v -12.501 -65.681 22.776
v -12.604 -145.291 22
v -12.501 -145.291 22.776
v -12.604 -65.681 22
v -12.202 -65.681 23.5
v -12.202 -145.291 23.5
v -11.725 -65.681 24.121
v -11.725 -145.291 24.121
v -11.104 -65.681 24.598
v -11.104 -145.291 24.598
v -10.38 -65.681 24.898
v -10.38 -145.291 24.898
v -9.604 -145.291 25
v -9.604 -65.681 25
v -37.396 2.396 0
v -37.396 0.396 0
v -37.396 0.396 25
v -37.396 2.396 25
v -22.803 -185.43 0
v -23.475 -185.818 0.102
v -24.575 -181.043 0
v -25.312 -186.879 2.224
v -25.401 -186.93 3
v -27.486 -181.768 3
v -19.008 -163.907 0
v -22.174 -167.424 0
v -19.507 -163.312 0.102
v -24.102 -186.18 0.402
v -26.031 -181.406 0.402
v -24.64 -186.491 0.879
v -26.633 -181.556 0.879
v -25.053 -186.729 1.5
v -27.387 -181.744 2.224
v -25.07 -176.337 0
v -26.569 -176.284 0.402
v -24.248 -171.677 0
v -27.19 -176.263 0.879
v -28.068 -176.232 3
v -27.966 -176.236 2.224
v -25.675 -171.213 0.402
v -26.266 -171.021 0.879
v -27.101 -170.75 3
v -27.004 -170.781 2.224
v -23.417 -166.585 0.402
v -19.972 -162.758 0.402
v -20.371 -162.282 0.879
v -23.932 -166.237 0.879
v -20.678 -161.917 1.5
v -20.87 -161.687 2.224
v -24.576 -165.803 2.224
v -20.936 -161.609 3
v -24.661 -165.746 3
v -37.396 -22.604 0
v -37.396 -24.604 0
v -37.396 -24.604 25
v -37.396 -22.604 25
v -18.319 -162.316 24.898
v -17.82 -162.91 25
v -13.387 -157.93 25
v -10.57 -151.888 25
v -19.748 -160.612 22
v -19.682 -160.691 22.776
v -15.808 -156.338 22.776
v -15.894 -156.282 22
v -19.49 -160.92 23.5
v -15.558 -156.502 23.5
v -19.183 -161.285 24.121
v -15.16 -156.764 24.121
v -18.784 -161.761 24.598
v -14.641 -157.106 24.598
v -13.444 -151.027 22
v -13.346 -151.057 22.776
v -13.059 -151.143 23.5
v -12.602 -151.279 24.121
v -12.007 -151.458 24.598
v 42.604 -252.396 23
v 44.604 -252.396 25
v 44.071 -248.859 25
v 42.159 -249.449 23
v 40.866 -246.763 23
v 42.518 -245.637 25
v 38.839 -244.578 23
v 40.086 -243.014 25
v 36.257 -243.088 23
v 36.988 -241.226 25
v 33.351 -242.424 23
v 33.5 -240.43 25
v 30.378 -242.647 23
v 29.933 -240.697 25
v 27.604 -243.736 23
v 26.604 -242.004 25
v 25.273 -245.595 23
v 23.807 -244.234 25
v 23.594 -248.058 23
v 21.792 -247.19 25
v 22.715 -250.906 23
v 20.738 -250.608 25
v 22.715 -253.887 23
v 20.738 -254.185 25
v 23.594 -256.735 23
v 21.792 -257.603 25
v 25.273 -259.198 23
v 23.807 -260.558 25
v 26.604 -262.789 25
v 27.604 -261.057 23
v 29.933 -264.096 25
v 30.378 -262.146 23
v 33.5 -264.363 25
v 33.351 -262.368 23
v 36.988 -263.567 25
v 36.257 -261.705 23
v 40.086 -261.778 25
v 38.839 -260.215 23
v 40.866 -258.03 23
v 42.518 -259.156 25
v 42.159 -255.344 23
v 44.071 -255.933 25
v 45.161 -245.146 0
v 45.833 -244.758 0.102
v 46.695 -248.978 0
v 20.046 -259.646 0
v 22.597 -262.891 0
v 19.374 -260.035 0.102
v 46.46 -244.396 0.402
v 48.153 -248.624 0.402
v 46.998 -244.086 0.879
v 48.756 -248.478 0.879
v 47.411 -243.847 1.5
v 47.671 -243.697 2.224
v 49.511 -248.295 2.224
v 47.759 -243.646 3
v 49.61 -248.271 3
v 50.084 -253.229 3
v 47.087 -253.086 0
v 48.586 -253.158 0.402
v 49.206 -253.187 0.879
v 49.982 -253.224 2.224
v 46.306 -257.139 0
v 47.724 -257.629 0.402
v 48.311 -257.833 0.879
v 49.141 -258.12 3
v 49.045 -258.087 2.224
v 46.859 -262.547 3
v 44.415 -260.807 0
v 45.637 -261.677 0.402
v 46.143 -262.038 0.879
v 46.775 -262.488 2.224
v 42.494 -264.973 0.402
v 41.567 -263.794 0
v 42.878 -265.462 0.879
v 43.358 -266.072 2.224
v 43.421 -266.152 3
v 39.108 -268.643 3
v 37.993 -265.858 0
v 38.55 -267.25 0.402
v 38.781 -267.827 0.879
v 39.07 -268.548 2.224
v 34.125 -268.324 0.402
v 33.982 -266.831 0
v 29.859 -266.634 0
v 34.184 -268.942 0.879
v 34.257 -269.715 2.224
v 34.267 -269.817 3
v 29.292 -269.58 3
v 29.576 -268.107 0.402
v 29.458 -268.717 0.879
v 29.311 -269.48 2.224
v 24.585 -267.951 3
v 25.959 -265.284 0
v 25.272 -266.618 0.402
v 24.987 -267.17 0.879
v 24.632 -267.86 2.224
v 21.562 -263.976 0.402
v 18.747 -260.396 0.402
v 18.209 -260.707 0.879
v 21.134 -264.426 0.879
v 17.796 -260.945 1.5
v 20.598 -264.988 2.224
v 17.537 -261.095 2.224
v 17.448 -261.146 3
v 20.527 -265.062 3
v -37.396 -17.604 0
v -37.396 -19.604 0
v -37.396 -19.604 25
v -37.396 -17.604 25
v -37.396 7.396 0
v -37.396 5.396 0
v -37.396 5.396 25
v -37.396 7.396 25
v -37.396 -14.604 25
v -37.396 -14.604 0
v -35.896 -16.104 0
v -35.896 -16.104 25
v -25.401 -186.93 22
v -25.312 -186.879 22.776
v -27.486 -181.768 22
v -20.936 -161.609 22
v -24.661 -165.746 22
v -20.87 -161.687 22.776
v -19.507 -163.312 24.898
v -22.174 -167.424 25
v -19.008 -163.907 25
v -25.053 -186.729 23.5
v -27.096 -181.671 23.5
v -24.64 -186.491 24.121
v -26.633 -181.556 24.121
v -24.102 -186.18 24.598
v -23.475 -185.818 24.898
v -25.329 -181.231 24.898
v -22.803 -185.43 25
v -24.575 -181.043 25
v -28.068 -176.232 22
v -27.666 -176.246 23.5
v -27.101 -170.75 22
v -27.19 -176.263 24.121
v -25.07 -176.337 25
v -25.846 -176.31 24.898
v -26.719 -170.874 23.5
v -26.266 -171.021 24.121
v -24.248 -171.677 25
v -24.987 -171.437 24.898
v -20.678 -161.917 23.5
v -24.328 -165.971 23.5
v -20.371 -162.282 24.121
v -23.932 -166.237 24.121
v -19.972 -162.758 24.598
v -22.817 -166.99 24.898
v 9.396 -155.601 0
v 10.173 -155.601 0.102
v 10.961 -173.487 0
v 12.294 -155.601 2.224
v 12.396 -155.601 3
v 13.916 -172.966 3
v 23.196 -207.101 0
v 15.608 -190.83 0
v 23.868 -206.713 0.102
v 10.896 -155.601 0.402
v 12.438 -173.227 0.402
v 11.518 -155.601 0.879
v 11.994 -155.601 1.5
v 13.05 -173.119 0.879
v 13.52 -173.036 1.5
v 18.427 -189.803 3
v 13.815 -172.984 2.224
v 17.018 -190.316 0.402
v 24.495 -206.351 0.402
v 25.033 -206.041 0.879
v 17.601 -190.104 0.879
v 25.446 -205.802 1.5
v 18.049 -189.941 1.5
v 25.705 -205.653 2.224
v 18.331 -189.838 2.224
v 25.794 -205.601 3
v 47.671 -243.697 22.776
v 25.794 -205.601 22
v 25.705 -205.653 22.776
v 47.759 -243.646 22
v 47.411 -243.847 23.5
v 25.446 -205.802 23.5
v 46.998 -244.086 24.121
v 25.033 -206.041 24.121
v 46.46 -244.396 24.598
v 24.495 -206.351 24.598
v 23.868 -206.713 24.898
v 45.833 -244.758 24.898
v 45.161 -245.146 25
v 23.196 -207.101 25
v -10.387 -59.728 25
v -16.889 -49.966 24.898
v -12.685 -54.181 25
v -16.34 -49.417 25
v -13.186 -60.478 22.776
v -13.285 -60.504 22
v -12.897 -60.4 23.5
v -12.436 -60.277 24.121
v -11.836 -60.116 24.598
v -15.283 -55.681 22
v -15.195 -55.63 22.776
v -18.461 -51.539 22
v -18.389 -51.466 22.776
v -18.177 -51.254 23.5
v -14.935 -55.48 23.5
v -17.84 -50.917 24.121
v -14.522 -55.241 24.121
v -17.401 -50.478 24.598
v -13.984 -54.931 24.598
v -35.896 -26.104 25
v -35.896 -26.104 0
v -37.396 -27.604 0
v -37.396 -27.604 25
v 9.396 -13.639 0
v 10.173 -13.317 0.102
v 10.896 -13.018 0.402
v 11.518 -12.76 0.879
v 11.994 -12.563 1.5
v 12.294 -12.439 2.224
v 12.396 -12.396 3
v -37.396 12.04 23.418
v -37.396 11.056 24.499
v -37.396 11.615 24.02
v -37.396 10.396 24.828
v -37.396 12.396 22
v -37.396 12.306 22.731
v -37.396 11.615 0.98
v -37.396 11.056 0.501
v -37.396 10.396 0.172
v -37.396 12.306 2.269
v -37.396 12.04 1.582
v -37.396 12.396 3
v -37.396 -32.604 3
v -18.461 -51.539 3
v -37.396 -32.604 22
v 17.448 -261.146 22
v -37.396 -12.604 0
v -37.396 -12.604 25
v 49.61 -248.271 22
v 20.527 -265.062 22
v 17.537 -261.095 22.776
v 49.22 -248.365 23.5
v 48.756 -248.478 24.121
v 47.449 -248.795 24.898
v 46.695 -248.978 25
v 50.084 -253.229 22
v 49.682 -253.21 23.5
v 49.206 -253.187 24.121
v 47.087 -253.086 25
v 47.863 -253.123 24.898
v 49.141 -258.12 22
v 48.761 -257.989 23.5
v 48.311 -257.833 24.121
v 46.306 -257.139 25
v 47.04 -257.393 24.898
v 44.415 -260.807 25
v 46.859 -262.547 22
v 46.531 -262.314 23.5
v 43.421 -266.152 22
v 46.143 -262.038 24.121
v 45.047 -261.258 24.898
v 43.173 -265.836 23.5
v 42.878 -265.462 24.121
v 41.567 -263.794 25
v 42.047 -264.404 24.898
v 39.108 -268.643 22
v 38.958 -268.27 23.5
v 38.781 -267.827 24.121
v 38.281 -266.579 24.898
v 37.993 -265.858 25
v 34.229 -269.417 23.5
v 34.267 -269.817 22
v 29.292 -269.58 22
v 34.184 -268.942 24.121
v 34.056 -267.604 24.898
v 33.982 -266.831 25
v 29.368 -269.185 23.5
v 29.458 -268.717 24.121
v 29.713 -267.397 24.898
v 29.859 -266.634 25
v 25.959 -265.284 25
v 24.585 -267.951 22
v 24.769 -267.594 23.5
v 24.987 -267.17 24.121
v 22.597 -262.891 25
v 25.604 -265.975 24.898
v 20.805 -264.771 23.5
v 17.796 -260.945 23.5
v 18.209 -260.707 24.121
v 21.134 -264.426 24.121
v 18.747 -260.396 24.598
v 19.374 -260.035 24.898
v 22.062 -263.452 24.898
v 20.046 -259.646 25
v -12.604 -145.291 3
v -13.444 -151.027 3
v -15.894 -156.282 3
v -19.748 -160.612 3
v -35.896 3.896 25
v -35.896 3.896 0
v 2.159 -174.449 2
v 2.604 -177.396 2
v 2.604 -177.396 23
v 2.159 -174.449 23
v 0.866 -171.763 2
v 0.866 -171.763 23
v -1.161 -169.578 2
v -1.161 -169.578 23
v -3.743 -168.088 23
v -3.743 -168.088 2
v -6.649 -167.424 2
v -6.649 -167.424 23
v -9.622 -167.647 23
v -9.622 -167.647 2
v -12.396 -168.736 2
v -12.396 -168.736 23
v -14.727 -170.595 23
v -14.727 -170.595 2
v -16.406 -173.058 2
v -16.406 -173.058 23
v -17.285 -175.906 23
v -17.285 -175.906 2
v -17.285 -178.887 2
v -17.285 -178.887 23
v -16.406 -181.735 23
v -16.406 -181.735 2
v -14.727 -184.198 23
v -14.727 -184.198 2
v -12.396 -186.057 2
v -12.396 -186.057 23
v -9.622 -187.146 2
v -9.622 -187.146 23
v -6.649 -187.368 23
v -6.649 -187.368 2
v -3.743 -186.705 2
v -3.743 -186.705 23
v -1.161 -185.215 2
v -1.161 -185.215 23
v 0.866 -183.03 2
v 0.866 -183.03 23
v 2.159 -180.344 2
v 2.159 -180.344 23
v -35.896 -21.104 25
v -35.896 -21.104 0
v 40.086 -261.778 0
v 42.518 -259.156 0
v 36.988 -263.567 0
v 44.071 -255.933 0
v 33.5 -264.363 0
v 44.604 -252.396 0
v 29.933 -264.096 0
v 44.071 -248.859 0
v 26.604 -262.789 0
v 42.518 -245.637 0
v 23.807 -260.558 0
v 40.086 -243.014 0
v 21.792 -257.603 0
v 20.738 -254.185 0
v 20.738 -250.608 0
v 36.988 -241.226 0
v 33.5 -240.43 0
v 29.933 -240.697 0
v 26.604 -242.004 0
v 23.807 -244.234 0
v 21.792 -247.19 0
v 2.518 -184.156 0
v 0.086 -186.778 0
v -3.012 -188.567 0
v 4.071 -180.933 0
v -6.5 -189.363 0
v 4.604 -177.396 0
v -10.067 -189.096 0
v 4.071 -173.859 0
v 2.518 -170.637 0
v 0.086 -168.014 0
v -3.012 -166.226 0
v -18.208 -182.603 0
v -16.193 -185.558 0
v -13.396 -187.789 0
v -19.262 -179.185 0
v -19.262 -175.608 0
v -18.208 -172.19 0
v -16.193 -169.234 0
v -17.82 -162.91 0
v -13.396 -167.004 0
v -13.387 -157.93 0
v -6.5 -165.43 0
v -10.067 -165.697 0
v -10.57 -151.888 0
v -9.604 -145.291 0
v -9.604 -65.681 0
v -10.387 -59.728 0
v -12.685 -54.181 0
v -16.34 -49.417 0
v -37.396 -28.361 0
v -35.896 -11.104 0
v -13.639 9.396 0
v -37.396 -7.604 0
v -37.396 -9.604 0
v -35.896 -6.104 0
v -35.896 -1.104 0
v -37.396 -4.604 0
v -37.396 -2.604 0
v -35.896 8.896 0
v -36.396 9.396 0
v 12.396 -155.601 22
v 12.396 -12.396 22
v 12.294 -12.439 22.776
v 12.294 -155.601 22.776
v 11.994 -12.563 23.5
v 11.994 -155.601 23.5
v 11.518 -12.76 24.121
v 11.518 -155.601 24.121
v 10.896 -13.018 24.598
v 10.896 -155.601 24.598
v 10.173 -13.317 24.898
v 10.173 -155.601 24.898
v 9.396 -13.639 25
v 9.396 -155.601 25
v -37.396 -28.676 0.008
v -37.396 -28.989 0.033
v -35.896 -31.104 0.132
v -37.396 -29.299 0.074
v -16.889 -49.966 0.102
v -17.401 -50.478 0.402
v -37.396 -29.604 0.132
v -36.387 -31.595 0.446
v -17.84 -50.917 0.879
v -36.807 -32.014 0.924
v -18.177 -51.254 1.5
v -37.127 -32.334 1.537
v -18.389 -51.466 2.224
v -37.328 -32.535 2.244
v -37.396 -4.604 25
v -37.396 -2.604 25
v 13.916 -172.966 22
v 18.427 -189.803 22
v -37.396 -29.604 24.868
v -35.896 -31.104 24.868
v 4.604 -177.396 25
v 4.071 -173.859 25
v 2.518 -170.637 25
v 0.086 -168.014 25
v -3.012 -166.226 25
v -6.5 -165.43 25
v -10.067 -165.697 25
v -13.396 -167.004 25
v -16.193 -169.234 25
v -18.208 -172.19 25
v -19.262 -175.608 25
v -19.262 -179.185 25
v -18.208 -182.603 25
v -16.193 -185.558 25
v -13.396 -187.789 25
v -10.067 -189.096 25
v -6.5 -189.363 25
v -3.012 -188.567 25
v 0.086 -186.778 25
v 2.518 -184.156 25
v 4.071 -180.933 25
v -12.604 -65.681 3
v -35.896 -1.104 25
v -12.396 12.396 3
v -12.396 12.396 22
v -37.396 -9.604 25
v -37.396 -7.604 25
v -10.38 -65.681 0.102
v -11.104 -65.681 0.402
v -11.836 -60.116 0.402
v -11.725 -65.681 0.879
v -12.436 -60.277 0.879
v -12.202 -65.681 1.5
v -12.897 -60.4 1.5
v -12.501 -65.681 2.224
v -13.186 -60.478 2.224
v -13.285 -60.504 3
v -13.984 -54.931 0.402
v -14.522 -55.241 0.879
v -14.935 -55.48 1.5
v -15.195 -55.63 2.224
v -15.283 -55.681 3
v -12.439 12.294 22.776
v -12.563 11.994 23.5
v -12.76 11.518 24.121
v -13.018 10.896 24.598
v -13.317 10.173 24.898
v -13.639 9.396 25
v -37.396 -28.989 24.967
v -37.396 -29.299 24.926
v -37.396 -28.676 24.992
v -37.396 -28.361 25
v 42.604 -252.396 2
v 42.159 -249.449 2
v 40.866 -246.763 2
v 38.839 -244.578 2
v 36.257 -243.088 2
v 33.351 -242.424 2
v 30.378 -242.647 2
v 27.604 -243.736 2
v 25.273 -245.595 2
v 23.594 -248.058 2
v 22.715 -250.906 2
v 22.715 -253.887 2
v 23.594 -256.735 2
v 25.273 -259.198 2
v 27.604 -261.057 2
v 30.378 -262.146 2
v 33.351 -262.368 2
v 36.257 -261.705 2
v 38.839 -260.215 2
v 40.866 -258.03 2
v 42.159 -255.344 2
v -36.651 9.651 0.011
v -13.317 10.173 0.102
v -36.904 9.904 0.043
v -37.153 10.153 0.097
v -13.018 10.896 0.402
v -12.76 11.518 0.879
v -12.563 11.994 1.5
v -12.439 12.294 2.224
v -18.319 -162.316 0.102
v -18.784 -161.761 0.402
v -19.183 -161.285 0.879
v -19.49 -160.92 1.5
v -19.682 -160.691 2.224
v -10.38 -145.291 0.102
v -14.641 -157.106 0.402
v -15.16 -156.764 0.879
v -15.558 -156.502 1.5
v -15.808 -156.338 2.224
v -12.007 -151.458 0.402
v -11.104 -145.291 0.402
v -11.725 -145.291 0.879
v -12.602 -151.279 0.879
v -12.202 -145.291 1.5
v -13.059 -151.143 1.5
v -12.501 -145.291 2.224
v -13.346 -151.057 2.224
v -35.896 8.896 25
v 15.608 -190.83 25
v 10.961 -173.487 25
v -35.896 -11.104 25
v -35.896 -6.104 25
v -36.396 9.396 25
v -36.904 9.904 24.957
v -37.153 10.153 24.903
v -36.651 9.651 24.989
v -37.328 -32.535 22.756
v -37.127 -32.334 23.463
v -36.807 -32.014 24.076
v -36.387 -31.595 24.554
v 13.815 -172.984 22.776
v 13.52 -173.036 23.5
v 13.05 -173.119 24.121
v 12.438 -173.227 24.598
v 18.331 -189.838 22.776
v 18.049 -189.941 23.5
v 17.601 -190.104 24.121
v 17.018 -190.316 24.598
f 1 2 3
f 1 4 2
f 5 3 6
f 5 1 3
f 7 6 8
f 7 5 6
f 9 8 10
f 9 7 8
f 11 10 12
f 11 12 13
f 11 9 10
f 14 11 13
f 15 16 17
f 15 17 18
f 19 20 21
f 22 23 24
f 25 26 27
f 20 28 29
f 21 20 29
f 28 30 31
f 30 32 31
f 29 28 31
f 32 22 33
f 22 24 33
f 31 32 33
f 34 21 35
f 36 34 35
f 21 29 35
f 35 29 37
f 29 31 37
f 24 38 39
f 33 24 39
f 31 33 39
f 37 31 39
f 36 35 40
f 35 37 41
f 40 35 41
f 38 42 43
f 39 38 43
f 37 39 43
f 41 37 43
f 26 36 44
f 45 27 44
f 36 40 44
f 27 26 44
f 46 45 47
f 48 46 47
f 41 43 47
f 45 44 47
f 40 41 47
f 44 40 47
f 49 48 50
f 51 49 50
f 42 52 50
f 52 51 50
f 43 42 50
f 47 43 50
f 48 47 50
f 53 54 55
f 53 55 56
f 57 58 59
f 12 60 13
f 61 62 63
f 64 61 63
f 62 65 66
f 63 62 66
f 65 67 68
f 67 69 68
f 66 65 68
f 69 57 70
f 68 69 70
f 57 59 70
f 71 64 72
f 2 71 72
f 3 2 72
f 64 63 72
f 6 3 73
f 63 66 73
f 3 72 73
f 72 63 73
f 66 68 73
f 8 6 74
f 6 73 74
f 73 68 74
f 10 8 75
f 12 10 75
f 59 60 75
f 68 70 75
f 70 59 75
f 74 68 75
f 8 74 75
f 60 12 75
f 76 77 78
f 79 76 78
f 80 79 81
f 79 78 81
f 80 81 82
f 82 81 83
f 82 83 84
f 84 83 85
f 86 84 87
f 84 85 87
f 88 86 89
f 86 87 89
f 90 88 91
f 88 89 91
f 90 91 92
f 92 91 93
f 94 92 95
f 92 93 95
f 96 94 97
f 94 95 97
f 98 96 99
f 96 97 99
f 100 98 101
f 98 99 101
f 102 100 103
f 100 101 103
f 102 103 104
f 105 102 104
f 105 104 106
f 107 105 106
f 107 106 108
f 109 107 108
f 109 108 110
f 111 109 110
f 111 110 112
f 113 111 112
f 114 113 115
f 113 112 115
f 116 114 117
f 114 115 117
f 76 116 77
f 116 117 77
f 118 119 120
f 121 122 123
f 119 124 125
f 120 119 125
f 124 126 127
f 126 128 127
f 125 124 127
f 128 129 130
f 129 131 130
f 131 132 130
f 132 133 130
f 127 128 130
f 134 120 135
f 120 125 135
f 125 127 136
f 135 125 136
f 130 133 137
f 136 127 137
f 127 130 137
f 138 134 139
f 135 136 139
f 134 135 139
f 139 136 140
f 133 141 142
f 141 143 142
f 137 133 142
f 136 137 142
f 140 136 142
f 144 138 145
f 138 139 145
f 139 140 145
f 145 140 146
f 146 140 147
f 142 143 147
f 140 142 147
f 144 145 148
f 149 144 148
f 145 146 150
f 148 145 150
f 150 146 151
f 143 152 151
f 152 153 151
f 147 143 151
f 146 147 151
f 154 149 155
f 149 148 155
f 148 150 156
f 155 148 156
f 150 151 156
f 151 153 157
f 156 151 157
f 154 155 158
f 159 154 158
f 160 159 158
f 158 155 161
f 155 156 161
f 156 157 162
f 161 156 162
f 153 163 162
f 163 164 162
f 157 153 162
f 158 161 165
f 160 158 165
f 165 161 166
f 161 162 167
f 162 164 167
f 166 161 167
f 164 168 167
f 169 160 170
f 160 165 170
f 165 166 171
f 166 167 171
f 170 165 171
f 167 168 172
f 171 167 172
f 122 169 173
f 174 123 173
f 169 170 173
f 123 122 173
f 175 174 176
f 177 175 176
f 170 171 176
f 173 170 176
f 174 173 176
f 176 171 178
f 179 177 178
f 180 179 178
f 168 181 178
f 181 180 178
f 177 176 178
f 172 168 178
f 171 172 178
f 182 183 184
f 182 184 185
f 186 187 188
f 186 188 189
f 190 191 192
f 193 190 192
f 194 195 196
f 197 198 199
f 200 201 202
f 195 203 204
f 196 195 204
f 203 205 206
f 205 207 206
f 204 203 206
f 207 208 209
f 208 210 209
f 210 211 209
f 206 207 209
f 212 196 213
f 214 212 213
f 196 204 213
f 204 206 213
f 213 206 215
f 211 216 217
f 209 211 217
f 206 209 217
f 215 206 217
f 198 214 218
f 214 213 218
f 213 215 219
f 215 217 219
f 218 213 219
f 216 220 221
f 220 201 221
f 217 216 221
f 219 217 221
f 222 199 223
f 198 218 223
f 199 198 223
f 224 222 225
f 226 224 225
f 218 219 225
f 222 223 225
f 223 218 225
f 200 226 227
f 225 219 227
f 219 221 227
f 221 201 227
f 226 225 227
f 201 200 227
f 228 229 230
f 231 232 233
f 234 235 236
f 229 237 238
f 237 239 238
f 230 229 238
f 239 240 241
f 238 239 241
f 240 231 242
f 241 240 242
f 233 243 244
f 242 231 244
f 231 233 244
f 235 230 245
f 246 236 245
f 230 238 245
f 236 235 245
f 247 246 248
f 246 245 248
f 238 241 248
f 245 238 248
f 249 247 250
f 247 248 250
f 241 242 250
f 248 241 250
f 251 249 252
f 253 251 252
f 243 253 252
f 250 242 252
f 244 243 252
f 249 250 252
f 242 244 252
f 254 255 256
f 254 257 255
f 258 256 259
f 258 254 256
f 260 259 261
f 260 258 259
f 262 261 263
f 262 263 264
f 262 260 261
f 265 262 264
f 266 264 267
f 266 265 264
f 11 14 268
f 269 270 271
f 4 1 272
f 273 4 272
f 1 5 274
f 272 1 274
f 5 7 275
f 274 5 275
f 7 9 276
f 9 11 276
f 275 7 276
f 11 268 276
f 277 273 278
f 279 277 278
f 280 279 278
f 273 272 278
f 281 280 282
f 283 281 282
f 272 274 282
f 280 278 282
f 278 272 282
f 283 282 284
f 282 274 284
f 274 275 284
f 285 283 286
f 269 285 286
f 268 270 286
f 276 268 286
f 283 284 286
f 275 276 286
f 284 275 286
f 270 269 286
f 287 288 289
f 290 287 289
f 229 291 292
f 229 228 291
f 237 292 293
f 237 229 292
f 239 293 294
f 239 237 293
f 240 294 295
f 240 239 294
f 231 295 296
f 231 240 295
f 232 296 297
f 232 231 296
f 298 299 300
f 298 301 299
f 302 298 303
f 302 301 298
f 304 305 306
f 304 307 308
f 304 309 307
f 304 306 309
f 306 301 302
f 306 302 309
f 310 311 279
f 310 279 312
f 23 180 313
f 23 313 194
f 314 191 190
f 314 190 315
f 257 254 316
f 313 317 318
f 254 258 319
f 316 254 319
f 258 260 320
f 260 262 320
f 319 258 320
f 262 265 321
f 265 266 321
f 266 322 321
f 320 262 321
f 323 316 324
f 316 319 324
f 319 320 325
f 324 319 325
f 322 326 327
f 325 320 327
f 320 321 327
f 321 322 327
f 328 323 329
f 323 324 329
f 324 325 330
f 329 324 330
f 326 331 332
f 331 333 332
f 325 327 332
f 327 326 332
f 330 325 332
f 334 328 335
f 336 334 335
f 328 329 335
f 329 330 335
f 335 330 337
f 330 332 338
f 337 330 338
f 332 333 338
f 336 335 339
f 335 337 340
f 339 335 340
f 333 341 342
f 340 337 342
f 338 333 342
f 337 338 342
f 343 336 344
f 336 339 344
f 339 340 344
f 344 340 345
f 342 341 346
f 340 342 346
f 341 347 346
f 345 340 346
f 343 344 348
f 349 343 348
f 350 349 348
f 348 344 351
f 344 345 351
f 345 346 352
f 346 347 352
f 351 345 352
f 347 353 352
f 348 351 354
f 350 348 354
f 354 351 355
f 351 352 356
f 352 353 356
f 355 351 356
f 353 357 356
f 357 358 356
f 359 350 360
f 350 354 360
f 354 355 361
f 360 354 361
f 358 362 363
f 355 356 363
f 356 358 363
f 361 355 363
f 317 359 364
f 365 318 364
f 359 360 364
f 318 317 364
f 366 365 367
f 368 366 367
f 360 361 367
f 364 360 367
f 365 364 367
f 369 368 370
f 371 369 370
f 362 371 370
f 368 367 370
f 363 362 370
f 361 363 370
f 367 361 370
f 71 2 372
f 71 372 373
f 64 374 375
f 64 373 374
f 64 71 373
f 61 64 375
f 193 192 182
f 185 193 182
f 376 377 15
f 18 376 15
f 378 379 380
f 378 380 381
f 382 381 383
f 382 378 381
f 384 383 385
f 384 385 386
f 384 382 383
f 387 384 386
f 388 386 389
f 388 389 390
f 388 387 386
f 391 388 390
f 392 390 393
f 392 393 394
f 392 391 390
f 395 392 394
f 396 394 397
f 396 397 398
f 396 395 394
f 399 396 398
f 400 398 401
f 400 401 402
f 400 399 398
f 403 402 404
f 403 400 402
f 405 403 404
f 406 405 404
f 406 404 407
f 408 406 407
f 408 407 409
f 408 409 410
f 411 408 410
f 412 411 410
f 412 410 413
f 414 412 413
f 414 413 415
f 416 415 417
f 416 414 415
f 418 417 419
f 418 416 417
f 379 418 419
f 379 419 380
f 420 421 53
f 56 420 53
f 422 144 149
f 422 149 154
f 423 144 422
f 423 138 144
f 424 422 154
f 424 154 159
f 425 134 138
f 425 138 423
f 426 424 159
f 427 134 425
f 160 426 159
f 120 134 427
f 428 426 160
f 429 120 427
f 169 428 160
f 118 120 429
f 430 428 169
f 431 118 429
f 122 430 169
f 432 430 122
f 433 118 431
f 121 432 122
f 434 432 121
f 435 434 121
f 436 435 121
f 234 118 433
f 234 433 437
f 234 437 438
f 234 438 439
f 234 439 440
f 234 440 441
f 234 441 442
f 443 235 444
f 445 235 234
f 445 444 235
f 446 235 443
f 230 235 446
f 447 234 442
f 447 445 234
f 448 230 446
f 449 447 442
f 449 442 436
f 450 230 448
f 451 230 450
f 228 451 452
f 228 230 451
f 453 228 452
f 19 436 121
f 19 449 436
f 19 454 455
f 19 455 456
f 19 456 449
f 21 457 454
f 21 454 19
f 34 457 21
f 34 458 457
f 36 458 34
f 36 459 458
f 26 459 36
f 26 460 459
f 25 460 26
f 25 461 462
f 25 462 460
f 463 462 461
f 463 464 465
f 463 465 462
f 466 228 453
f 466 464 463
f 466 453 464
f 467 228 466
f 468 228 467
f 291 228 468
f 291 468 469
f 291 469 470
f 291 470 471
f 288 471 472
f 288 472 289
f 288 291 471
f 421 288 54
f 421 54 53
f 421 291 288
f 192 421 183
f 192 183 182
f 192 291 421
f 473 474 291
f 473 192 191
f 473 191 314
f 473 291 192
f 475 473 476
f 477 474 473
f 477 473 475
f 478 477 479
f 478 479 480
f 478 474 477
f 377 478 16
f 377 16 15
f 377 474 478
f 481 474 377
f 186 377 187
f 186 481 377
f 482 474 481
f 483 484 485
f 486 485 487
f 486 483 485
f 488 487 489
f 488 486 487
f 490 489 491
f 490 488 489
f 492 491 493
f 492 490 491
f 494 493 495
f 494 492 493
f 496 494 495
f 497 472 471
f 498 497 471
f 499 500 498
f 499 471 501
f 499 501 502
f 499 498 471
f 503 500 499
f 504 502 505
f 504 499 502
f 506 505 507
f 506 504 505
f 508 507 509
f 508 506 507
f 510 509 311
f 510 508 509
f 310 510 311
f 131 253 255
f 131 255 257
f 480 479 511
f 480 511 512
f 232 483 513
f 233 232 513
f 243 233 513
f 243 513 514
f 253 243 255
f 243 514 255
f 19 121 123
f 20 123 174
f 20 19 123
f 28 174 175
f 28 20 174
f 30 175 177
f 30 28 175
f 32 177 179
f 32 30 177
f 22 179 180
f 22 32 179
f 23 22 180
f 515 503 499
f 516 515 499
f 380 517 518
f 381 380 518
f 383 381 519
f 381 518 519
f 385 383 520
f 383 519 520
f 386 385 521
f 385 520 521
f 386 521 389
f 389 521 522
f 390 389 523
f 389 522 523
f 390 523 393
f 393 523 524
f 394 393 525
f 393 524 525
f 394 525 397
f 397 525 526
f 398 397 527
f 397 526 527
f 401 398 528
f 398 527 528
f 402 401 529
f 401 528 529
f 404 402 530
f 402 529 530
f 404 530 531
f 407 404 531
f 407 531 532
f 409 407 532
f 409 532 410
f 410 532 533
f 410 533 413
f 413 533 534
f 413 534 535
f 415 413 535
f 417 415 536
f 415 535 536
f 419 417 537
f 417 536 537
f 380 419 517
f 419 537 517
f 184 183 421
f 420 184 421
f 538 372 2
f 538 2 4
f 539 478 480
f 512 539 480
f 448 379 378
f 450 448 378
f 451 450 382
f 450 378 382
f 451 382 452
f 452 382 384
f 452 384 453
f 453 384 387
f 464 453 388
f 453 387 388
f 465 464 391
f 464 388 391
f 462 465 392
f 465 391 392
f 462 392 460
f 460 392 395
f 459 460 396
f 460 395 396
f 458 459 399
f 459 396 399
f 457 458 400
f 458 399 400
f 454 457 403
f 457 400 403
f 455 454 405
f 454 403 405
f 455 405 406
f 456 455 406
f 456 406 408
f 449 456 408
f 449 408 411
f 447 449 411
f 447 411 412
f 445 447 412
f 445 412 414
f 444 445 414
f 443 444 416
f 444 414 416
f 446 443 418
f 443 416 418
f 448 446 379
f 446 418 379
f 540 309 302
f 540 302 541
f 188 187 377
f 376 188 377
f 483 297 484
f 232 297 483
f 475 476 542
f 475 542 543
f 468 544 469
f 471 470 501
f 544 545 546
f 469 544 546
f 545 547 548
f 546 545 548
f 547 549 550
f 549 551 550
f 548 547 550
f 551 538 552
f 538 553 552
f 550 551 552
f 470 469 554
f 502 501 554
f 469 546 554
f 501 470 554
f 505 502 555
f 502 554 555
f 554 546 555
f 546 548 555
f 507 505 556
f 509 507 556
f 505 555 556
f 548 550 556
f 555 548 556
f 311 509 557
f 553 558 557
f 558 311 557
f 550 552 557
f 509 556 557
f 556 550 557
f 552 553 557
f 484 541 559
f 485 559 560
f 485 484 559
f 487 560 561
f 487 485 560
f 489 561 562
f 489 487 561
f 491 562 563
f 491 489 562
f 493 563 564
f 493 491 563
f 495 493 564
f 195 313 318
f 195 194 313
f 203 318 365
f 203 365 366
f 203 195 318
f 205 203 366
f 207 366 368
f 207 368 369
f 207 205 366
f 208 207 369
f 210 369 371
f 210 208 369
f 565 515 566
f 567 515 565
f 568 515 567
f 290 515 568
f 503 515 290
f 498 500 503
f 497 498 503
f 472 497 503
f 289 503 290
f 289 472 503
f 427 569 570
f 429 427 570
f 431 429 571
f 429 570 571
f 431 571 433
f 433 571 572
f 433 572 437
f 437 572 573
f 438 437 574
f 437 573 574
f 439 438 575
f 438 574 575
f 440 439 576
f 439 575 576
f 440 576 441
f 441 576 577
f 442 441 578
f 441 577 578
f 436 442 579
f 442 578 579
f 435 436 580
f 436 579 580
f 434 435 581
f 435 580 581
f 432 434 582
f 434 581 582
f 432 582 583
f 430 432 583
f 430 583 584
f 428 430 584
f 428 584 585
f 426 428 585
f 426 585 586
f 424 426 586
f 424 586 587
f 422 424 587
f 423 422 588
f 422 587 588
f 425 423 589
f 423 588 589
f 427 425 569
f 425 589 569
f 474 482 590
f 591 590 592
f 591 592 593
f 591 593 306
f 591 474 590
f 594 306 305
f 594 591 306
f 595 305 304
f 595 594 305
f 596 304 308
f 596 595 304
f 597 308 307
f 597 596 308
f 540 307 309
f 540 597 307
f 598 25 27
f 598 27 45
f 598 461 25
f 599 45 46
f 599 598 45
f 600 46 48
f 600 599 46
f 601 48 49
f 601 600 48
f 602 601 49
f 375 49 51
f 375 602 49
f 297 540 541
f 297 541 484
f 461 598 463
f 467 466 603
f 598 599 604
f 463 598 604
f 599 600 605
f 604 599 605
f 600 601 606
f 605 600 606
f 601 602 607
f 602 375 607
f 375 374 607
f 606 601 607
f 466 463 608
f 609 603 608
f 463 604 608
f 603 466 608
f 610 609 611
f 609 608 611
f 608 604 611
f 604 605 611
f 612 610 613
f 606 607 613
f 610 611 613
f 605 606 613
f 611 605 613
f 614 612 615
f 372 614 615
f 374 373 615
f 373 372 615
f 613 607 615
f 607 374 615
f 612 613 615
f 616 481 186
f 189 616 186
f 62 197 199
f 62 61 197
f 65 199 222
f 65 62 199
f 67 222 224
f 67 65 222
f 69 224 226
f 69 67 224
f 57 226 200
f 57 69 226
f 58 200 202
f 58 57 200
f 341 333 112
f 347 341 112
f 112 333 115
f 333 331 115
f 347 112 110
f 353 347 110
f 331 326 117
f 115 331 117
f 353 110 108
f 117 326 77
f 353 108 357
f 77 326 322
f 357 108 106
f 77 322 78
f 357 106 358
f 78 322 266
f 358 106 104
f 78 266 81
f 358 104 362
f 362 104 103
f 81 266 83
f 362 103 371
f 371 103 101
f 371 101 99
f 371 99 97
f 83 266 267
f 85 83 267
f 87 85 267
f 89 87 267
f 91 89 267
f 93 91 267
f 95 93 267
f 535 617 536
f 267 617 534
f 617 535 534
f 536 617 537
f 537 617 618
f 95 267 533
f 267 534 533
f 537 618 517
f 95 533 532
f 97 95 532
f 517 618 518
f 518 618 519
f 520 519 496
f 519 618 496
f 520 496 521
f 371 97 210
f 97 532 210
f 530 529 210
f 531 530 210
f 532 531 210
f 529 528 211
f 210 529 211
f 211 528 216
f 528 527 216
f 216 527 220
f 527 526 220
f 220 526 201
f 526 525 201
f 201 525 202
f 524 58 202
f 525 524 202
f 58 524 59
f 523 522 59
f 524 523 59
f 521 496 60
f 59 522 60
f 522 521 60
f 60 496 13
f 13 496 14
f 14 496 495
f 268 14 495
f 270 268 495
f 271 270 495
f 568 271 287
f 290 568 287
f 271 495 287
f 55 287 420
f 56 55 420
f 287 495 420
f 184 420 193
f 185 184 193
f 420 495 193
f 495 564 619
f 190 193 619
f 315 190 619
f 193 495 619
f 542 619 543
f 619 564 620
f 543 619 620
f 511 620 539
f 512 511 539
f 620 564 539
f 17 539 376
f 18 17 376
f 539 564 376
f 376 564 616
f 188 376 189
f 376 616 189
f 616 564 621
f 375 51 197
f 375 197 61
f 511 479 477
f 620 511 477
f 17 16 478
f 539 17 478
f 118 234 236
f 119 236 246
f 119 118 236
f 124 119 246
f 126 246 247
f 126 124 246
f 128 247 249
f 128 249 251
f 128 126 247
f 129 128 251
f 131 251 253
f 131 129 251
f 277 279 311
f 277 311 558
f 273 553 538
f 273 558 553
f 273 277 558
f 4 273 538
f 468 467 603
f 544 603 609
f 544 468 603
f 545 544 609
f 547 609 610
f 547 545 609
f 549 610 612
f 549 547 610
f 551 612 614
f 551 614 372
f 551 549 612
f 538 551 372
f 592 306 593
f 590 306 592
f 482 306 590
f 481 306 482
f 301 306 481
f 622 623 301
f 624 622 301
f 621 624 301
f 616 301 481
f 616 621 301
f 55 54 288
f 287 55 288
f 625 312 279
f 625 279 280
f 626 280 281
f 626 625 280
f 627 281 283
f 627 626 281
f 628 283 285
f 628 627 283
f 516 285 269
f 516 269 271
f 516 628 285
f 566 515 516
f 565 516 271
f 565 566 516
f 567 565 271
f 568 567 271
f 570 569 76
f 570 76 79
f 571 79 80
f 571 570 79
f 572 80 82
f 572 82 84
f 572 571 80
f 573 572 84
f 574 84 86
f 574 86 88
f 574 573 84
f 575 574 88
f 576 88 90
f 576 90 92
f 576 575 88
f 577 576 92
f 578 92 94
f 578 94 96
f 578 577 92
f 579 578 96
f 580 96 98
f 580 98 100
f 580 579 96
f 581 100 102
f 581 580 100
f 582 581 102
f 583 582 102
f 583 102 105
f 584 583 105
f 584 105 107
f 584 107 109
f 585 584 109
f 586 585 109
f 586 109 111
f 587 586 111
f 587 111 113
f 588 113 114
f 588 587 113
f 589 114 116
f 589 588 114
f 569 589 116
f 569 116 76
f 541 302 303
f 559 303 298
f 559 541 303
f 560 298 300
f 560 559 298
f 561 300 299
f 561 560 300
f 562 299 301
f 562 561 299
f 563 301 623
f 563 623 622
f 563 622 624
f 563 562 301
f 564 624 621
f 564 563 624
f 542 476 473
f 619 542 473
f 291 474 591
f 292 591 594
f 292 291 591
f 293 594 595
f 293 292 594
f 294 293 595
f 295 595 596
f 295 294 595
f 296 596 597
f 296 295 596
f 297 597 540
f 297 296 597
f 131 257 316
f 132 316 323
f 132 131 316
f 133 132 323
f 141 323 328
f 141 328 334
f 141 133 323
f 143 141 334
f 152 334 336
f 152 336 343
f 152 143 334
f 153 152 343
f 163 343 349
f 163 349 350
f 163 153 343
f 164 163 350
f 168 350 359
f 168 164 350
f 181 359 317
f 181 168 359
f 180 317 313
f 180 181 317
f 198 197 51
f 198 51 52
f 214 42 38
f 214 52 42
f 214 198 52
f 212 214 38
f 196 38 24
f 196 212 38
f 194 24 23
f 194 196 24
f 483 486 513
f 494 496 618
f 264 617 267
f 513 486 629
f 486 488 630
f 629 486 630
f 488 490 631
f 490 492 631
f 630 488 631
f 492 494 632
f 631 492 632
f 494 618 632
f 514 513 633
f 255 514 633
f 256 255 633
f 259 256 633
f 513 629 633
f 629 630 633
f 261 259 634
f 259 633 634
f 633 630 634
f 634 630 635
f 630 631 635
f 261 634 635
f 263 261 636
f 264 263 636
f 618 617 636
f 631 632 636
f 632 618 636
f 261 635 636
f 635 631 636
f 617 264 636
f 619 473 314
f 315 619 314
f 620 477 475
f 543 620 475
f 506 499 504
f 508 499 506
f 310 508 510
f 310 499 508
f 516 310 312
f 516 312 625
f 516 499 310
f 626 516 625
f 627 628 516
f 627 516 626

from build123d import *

# Parameters (mm, degrees)
IZIM1_R                     = 10
Y_KSEKLIK_EKSTR_ZYON1_DEPTH = 25
RADYUS1_R                   = 20
RADYUS2_R                   = 100
PAH1_SIZE                   = 2
KES_EKSTR_ZYON1_DEPTH       = 276.643654753
KES_EKSTR_ZYON1_DEPTH_BACK  = 276.643654753
RADYUS3_R                   = 3


with BuildPart() as part:
    # Çizim1 → Yükseklik-Ekstrüzyon1 (new body)
    with BuildSketch(Plane.XY):
        with BuildLine():
            Line((-37.396370289, 12.396370289), (-12.396370289, 12.396370289))
            Line((-12.396370289, 12.396370289), (12.396370289, -12.396370289))
            Line((12.396370289, -12.396370289), (12.396370289, -182.396370289))
            Line((12.396370289, -182.396370289), (47.759074277, -243.646370289))
            ThreePointArc((47.759074277, -243.646370289), (41.353629711, -267.551814855), (17.448185145, -261.146370289))
            Line((17.448185145, -261.146370289), (-33.791651246, -172.396370289))
            Line((-33.791651246, -172.396370289), (-12.603629711, -154.617509234))
            Line((-12.603629711, -154.617509234), (-12.603629711, -57.396370289))
            Line((-12.603629711, -57.396370289), (-37.396370289, -32.603629711))
            Line((-37.396370289, -32.603629711), (-37.396370289, 12.396370289))
        make_face()
        with Locations((-7.396370289, -177.396370289)):
            Circle(IZIM1_R, mode=Mode.SUBTRACT)
        with Locations((32.603629711, -252.396370289)):
            Circle(IZIM1_R, mode=Mode.SUBTRACT)
    extrude(amount=Y_KSEKLIK_EKSTR_ZYON1_DEPTH)

    # Radyus1
    radyus1_edges = [part.edges().sort_by_distance(p)[0] for p in [
        (-33.791651246, -172.396370289, 12.5),
        (-12.603629711, -154.617509234, 12.5),
        (-12.603629711, -57.396370289, 12.5),
    ]]
    fillet(radyus1_edges, radius=RADYUS1_R)

    # Radyus2
    radyus2_edges = [part.edges().sort_by_distance(p)[0] for p in [
        (12.396370289, -182.396370289, 12.5),
    ]]
    fillet(radyus2_edges, radius=RADYUS2_R)

    # Pah1
    pah1_edges = [part.edges().sort_by_distance(p)[0] for p in [
        (-17.396370289, -177.396370289, 0),
        (-17.396370289, -177.396370289, 25),
        (22.603629711, -252.396370289, 0),
        (22.603629711, -252.396370289, 25),
    ]]
    chamfer(pah1_edges, length=PAH1_SIZE)

    # Çizim2 → Kes-Ekstrüzyon1 (cut, two sides: drawn at the far end of the back side and taken through both)
    with BuildSketch(Plane(origin=(0, 0, 0), x_dir=(-1, 0, 0), z_dir=(0, 0, -1)).offset(-KES_EKSTR_ZYON1_DEPTH_BACK)):
        Polygon((37.396370289, 12.396370289), (37.396370289, 10.396370289), (35.896370289, 8.896370289), (37.396370289, 7.396370289), (37.396370289, 5.396370289), (35.896370289, 3.896370289), (37.396370289, 2.396370289), (37.396370289, 0.396370289), (35.896370289, -1.103629711), (37.396370289, -2.603629711), (37.396370289, -4.603629711), (35.896370289, -6.103629711), (37.396370289, -7.603629711), (37.396370289, -9.603629711), (35.896370289, -11.103629711), (37.396370289, -12.603629711), (37.396370289, -14.603629711), (35.896370289, -16.103629711), (37.396370289, -17.603629711), (37.396370289, -19.603629711), (35.896370289, -21.103629711), (37.396370289, -22.603629711), (37.396370289, -24.603629711), (35.896370289, -26.103629711), (37.396370289, -27.603629711), (37.396370289, -29.603629711), (35.896370289, -31.103629711), (37.396370289, -32.603629711), (40.97255524, -32.603629711), (40.97255524, 12.396370289), align=None)
    extrude(amount=KES_EKSTR_ZYON1_DEPTH + KES_EKSTR_ZYON1_DEPTH_BACK, mode=Mode.SUBTRACT)

    # Radyus3
    radyus3_edges = [part.edges().sort_by_distance(p)[0] for p in [
        (-27.928932188, -42.071067812, 25),
        (-14.126039061, -58.026972889, 25),
        (-12.603629711, -105.485998804, 25),
        (-14.47747397, -153.743721305, 25),
        (-20.341888285, -161.110679149, 25),
        (-27.776301919, -173.457038674, 25),
        (-3.976234895, -224.038186258, 25),
        (41.353629711, -267.551814855, 25),
        (36.776452094, -224.623910668, 25),
        (15.80378766, -181.483355556, 25),
        (-27.928932188, -42.071067812, 0),
        (-14.126039061, -58.026972889, 0),
        (-12.603629711, -105.485998804, 0),
        (-14.47747397, -153.743721305, 0),
        (-20.341888285, -161.110679149, 0),
        (-27.776301919, -173.457038674, 0),
        (-3.976234895, -224.038186258, 0),
        (41.353629711, -267.551814855, 0),
        (36.776452094, -224.623910668, 0),
        (15.80378766, -181.483355556, 0),
        (12.396370289, -83.998910668, 25),
        (0, 0, 25),
        (-24.896370289, 12.396370289, 25),
        (-24.896370289, 12.396370289, 0),
        (12.396370289, -83.998910668, 0),
        (0, 0, 0),
    ]]
    fillet(radyus3_edges, radius=RADYUS3_R)


solid = part.part
